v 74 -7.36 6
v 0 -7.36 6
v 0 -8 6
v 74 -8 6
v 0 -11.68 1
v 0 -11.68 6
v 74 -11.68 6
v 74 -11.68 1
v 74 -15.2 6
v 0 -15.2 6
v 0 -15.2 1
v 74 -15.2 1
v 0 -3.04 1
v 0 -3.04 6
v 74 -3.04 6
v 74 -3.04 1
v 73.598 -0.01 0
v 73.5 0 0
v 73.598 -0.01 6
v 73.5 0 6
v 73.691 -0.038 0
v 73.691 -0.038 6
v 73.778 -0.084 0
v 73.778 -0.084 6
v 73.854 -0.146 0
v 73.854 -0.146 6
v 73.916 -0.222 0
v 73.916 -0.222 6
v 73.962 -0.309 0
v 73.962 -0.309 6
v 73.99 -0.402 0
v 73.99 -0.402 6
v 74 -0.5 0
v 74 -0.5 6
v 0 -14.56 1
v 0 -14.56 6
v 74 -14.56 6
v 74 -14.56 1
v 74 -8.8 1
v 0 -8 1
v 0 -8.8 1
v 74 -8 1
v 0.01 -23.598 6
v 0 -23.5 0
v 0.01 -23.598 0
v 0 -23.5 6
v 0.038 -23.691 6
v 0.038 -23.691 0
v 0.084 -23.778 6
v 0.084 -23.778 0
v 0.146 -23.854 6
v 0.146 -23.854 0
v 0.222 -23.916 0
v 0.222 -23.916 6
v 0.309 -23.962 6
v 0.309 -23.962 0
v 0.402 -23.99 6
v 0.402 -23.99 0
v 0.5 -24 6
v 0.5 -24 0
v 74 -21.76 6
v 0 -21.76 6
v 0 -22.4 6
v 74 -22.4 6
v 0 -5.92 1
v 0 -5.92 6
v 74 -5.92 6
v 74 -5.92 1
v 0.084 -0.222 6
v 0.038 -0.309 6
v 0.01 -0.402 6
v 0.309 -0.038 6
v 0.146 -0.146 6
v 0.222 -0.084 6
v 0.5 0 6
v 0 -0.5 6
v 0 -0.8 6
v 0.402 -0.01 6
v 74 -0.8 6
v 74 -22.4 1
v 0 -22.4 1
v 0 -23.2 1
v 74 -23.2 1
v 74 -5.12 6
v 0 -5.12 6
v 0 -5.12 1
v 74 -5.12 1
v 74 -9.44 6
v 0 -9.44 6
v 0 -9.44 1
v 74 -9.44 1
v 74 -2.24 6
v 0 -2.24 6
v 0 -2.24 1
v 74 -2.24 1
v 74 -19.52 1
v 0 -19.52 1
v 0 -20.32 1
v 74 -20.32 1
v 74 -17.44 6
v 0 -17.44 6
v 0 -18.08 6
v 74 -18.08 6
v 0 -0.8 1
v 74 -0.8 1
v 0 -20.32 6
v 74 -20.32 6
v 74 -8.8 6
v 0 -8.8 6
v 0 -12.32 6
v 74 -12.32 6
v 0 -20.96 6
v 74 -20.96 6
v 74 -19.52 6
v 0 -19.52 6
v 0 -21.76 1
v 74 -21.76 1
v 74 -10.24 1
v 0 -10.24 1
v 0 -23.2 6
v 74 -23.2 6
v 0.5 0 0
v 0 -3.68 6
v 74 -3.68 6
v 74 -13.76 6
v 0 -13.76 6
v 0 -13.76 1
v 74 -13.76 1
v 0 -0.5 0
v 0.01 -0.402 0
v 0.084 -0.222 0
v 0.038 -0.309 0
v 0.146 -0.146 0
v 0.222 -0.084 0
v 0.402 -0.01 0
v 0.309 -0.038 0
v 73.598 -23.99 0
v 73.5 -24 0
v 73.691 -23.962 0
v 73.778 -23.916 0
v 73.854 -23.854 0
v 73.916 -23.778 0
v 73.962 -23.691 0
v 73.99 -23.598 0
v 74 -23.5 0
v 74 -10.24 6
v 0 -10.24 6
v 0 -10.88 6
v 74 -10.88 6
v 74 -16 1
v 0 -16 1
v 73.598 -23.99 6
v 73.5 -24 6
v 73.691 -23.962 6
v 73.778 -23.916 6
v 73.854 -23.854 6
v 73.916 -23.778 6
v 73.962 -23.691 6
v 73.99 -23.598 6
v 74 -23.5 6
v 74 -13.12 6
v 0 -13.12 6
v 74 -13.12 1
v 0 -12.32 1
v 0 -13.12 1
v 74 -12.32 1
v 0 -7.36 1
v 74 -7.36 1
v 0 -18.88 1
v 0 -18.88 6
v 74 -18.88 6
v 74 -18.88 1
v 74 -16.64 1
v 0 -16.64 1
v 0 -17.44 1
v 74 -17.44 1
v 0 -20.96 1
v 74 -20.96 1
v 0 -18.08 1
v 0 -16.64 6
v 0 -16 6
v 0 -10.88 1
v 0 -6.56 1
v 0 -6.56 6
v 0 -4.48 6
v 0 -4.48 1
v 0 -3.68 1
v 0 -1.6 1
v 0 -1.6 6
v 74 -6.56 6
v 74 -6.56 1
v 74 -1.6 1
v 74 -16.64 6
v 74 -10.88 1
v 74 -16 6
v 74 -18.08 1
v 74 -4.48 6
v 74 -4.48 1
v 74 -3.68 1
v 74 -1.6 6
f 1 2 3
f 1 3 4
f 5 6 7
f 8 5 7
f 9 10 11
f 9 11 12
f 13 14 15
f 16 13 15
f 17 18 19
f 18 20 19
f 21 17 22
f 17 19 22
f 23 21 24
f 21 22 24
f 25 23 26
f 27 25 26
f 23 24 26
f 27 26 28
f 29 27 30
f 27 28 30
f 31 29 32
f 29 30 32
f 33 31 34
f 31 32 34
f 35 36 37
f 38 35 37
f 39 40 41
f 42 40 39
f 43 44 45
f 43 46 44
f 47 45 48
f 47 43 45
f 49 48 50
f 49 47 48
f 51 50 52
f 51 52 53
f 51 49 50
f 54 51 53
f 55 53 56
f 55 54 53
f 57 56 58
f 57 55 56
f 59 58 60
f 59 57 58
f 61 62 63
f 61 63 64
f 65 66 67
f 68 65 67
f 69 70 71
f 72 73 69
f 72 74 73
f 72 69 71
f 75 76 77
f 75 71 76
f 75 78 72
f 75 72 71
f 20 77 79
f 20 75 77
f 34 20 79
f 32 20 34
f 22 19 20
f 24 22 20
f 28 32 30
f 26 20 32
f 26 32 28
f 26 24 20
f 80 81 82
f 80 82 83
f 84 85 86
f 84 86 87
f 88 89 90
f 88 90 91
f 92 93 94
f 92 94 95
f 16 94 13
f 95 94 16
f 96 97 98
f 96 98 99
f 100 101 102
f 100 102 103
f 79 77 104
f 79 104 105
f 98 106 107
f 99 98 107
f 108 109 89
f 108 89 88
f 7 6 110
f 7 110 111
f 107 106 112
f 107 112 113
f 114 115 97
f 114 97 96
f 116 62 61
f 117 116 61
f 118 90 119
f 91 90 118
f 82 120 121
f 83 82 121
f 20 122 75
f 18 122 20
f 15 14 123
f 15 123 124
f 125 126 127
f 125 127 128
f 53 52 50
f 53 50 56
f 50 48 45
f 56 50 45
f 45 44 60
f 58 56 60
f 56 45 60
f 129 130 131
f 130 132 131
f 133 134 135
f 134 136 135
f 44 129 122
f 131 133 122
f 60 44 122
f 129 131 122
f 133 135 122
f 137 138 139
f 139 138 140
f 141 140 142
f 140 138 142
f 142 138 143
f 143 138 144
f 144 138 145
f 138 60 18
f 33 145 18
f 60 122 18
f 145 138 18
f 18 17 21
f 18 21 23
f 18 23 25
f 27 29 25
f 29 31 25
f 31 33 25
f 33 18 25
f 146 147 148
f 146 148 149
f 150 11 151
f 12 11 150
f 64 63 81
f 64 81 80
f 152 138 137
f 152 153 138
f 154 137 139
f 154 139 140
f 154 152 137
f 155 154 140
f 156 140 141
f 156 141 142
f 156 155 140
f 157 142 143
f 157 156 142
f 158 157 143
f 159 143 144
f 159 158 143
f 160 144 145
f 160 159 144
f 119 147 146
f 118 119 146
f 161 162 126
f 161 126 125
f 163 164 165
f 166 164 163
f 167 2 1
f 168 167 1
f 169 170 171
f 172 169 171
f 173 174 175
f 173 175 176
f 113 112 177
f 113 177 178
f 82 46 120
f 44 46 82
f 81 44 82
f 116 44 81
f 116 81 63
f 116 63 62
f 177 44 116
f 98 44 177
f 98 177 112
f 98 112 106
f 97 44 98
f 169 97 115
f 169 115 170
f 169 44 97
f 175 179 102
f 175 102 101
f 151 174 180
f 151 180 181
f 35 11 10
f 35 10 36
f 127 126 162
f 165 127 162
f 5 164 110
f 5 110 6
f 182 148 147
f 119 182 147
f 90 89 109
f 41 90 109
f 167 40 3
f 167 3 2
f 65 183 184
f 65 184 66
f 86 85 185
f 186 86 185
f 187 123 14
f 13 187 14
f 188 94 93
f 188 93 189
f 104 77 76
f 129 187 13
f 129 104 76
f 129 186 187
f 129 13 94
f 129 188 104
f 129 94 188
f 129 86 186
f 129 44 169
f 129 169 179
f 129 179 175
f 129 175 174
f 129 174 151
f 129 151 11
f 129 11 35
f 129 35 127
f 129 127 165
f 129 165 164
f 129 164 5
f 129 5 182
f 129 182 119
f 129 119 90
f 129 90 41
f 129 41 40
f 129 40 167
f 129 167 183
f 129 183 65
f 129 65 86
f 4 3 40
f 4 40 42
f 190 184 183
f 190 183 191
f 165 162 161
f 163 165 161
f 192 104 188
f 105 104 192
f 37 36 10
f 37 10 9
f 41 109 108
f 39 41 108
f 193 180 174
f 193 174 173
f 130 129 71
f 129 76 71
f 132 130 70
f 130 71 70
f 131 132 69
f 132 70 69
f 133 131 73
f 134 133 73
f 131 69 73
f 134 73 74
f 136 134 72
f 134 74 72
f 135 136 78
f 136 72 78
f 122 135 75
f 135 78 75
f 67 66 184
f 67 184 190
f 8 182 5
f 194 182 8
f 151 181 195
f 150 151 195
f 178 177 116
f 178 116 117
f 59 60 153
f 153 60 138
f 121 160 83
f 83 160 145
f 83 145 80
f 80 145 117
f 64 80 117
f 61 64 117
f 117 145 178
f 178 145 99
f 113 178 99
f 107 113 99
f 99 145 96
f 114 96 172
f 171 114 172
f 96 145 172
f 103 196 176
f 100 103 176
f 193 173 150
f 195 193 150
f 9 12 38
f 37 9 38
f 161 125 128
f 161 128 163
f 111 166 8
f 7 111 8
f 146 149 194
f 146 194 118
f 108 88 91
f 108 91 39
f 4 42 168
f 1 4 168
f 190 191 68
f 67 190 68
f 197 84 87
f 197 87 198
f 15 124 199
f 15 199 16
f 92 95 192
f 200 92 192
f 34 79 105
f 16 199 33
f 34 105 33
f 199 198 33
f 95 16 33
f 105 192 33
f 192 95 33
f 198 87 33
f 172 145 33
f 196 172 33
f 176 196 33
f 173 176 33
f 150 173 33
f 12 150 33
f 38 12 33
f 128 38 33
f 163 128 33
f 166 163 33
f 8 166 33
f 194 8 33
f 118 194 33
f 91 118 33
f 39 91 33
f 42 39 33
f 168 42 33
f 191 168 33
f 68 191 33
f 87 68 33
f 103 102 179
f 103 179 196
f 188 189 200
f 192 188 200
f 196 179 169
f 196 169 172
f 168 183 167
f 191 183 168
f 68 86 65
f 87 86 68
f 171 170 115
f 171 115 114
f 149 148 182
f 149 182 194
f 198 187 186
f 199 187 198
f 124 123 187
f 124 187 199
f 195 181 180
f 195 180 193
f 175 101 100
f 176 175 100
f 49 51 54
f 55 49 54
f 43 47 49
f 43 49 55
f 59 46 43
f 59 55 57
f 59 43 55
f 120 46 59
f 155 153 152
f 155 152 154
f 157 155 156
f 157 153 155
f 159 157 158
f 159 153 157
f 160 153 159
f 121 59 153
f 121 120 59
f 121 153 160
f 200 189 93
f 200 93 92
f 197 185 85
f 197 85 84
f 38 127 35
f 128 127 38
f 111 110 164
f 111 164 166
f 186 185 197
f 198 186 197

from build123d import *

# Parameters (mm, degrees)
SKETCH_1_W          = 74
SKETCH_1_H          = 24
EXTRUDE_1_DEPTH     = 6
SKETCH_2_W          = 74
SKETCH_2_H          = 0.8
CUT_EXTRUDE_1_DEPTH = 5
FILLET_1_R          = 0.5


with BuildPart() as part:
    # 草图1 → 凸台-拉伸1 (new body)
    with BuildSketch(Plane.XY):
        with Locations((37, -12)):
            Rectangle(SKETCH_1_W, SKETCH_1_H)
    extrude(amount=EXTRUDE_1_DEPTH)

    # 草图2 → 切除-拉伸1 (cut)
    with BuildSketch(Plane.XY.offset(6)):
        with Locations((37, -22.8)):
            Rectangle(SKETCH_2_W, SKETCH_2_H)
        with Locations((37, -21.36)):
            Rectangle(SKETCH_2_W, SKETCH_2_H)
        with Locations((37, -19.92)):
            Rectangle(SKETCH_2_W, SKETCH_2_H)
        with Locations((37, -18.48)):
            Rectangle(SKETCH_2_W, SKETCH_2_H)
        with Locations((37, -17.04)):
            Rectangle(SKETCH_2_W, SKETCH_2_H)
        with Locations((37, -15.6)):
            Rectangle(SKETCH_2_W, SKETCH_2_H)
        with Locations((37, -14.16)):
            Rectangle(SKETCH_2_W, SKETCH_2_H)
        with Locations((37, -12.72)):
            Rectangle(SKETCH_2_W, SKETCH_2_H)
        with Locations((37, -11.28)):
            Rectangle(SKETCH_2_W, SKETCH_2_H)
        with Locations((37, -9.84)):
            Rectangle(SKETCH_2_W, SKETCH_2_H)
        with Locations((37, -8.4)):
            Rectangle(SKETCH_2_W, SKETCH_2_H)
        with Locations((37, -6.96)):
            Rectangle(SKETCH_2_W, SKETCH_2_H)
        with Locations((37, -5.52)):
            Rectangle(SKETCH_2_W, SKETCH_2_H)
        with Locations((37, -4.08)):
            Rectangle(SKETCH_2_W, SKETCH_2_H)
        with Locations((37, -2.64)):
            Rectangle(SKETCH_2_W, SKETCH_2_H)
        with Locations((37, -1.2)):
            Rectangle(SKETCH_2_W, SKETCH_2_H)
    extrude(amount=-CUT_EXTRUDE_1_DEPTH, mode=Mode.SUBTRACT)

    # 圆角1
    fillet_1_edges = [part.edges().sort_by_distance(p)[0] for p in [
        (0, 0, 3),
        (74, 0, 3),
        (74, -24, 3),
        (0, -24, 3),
    ]]
    fillet(fillet_1_edges, radius=FILLET_1_R)


solid = part.part
